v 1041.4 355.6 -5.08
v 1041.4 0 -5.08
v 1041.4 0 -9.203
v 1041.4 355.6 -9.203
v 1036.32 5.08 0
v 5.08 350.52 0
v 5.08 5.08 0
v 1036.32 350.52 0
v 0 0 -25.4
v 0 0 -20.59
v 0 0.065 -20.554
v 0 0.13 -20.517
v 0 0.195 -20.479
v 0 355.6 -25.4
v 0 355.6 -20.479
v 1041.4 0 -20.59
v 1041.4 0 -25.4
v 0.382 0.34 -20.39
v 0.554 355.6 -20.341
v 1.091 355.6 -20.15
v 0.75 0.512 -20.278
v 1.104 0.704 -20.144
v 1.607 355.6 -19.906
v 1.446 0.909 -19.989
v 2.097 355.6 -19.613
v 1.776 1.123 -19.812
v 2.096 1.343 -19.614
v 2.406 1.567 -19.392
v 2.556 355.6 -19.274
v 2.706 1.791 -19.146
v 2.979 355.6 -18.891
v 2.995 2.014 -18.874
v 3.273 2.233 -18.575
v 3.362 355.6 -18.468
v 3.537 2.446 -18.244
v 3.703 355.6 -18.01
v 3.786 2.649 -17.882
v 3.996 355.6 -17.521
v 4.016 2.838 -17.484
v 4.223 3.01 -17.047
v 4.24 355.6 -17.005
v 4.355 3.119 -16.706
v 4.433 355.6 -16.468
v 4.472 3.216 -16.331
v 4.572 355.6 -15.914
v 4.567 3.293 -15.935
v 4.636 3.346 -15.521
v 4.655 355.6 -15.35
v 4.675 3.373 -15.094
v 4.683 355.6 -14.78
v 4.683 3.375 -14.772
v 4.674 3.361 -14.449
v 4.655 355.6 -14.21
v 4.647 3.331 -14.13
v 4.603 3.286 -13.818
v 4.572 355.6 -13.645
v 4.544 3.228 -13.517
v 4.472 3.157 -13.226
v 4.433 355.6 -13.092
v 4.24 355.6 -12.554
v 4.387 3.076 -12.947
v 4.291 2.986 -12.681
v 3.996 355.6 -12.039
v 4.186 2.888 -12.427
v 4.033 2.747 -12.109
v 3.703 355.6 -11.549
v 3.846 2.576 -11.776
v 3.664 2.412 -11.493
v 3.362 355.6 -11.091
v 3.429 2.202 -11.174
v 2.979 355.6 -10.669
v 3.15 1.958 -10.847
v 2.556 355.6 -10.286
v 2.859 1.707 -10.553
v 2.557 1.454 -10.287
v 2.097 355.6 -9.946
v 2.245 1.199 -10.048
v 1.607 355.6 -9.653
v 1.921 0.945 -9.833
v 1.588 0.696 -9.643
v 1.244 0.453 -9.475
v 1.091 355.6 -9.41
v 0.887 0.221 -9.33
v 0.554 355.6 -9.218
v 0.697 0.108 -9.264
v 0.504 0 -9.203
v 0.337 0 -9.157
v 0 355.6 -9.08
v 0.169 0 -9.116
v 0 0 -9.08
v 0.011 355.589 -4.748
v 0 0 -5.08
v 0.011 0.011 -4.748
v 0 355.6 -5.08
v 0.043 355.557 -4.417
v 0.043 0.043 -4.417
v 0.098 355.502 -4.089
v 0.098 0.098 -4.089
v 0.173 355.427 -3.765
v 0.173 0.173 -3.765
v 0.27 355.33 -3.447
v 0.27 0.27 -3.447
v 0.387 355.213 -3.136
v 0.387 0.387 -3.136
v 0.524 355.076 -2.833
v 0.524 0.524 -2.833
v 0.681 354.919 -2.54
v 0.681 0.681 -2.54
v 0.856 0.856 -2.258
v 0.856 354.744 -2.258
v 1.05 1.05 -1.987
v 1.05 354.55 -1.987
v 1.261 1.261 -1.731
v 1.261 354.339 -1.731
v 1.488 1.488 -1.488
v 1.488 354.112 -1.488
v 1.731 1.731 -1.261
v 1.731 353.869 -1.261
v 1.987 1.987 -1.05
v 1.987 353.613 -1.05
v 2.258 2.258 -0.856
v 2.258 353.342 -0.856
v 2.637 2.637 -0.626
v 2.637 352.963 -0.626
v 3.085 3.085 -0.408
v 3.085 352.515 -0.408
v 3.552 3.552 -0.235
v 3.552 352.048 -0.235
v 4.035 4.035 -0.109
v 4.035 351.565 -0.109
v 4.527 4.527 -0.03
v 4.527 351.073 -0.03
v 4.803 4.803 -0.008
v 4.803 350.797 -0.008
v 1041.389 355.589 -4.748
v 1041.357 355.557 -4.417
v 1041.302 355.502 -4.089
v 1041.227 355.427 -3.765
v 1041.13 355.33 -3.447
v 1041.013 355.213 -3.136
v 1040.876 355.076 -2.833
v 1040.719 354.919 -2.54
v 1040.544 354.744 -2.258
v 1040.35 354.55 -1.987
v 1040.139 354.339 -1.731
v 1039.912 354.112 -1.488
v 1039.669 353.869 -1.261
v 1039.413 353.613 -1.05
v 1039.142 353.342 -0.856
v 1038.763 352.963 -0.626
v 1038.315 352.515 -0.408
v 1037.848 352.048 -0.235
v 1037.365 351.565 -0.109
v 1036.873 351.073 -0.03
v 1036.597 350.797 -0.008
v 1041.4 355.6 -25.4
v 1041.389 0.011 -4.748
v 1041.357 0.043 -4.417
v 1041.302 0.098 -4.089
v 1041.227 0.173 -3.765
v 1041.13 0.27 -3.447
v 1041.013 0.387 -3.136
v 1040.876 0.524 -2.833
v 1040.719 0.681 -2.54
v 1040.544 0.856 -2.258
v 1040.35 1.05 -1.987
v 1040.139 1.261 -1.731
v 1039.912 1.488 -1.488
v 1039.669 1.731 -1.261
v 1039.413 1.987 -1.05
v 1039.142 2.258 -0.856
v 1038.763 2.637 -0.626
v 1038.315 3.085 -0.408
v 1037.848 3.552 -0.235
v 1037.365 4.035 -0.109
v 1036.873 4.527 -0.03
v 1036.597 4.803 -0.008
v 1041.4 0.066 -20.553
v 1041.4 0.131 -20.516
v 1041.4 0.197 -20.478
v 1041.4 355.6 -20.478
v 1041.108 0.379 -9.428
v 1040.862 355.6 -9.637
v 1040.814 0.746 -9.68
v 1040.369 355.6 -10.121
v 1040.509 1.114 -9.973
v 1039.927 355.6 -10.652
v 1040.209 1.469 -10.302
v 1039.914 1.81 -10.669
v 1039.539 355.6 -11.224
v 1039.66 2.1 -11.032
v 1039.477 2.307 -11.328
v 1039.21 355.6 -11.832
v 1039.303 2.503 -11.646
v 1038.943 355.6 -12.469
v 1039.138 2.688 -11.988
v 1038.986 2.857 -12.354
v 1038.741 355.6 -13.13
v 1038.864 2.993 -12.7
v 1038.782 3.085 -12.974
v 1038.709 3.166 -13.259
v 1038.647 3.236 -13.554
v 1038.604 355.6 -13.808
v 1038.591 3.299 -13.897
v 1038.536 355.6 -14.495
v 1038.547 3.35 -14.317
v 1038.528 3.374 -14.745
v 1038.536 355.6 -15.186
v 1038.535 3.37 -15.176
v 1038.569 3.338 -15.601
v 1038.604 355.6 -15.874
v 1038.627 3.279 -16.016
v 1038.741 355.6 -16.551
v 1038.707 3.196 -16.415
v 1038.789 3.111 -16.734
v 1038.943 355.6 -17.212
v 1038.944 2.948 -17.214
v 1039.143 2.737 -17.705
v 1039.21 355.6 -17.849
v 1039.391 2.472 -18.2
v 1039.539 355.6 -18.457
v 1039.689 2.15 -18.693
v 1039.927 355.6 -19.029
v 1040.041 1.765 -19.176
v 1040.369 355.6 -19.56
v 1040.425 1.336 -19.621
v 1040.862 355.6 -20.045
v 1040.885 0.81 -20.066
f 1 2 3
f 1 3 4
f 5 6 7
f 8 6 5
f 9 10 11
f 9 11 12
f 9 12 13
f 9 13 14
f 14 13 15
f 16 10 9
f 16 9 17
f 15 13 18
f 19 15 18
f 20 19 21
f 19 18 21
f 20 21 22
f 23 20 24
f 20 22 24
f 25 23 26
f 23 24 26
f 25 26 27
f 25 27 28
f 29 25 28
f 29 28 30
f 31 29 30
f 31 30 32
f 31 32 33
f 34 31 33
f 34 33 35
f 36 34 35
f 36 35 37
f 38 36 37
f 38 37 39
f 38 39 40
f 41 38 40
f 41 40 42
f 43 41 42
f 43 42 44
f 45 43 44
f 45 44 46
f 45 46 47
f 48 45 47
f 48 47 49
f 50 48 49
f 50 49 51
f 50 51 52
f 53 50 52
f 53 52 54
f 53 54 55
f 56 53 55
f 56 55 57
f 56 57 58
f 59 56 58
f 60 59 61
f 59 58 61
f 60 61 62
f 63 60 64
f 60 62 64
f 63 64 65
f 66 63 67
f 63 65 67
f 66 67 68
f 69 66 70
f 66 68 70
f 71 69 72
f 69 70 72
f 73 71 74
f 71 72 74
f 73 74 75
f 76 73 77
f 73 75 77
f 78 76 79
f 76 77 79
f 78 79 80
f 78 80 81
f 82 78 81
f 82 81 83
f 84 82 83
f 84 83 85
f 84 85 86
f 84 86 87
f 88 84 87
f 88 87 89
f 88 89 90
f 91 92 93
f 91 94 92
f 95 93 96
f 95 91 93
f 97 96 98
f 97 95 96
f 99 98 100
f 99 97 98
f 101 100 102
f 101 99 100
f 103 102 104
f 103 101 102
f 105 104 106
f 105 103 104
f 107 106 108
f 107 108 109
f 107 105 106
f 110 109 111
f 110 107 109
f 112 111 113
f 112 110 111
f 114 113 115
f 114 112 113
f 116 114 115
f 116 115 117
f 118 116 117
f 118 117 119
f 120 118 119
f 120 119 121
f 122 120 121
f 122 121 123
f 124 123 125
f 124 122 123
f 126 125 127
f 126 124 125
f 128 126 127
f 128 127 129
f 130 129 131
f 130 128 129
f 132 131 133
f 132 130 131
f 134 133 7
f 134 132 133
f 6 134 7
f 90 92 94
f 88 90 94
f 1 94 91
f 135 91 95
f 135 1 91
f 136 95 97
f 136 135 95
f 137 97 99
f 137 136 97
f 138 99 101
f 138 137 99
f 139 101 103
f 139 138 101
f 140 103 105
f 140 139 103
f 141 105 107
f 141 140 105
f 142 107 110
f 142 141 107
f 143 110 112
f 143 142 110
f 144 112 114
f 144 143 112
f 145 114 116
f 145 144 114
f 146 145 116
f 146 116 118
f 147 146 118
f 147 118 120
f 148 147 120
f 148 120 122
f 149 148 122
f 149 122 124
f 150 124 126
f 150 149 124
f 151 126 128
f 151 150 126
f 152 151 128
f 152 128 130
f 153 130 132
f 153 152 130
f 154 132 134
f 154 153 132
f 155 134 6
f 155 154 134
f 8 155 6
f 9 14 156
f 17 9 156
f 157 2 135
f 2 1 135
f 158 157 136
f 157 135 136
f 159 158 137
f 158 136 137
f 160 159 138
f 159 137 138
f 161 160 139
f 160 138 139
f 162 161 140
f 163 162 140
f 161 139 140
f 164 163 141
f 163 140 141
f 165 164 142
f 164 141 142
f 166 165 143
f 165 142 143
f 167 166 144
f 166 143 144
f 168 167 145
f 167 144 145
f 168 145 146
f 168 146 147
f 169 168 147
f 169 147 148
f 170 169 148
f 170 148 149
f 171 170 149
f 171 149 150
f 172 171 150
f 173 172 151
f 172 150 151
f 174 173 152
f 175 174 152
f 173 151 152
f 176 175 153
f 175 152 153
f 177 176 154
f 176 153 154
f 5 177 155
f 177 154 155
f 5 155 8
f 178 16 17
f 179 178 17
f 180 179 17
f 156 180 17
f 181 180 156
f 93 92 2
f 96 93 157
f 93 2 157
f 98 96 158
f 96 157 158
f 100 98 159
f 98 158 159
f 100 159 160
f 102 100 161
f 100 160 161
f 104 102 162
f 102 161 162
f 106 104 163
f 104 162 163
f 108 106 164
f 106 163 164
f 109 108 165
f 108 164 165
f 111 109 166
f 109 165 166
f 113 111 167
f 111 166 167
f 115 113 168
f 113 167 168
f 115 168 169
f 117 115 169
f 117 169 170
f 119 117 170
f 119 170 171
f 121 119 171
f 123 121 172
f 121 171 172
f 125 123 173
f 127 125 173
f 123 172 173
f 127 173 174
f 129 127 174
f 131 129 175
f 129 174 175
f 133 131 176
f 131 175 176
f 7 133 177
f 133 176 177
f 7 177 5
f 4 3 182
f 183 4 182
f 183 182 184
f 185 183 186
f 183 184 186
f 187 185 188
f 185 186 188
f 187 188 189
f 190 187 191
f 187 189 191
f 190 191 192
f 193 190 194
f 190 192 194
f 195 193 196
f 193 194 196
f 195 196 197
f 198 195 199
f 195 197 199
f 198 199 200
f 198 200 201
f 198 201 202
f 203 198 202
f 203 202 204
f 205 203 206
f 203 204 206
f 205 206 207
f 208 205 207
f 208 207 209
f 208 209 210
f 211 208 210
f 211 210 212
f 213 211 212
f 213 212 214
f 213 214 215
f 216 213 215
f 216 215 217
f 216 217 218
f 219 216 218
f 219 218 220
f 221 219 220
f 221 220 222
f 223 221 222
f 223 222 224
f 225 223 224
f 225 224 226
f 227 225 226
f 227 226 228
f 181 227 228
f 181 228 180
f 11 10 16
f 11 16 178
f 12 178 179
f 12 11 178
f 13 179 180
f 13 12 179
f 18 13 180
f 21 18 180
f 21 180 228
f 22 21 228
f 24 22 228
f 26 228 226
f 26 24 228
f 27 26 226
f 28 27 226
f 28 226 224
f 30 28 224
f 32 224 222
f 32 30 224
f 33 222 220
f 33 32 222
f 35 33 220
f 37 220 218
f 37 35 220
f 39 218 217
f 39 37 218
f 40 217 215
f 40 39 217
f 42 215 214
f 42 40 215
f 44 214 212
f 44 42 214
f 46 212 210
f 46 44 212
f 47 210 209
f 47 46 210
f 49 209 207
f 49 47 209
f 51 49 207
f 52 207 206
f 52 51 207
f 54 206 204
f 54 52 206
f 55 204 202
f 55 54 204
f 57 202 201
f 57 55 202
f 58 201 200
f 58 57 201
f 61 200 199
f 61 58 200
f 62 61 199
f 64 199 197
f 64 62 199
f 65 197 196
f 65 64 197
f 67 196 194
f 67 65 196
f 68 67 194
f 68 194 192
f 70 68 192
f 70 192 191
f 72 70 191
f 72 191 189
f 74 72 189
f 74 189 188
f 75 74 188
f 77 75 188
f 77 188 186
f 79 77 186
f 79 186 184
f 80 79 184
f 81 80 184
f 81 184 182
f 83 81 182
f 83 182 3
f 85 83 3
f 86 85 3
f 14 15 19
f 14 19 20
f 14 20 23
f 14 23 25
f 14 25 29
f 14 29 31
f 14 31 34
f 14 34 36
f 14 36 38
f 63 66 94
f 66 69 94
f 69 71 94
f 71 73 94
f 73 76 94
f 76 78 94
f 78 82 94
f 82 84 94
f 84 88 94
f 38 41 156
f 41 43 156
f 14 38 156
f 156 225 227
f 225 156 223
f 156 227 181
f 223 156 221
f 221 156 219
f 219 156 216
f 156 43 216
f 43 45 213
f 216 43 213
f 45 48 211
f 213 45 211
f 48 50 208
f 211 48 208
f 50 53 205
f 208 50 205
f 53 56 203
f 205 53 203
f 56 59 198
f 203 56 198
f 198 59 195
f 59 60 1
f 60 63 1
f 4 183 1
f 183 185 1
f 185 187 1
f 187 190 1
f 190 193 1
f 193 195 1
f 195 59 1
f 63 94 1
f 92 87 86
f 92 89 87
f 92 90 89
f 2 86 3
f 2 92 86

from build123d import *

# Parameters (mm, degrees)
F0_W     = 1041.4
F0_H     = 355.6
F1_DEPTH = 25.4
F2_R     = 5.08
F4_DEPTH = 355.601
F6_DEPTH = 1041.401
F8_DEPTH = 355.601


with BuildPart() as f1:
    # F0 (on Top) → F1 (new body)
    with BuildSketch(Plane.XY):
        with Locations((520.7, 177.8)):
            Rectangle(F0_W, F0_H)
    extrude(amount=-F1_DEPTH)

    # F2
    f2_edges = [f1.edges().sort_by_distance(p)[0] for p in [
        (520.7, 0, 0),
        (1041.4, 177.8, 0),
        (520.7, 355.6, 0),
        (0, 177.8, 0),
    ]]
    fillet(f2_edges, radius=F2_R)

    # F3 (on face) → F4 (cut, through all)
    with BuildSketch(Plane.XZ):
        with BuildLine():
            Line((0, -9.080117), (0, -20.479154))
            ThreePointArc((0, -20.479154), (4.683372, -14.779635), (0, -9.080117))
        make_face()
    extrude(amount=-F4_DEPTH, mode=Mode.SUBTRACT)

    # F5 (on Right) → F6 (cut, through all)
    with BuildSketch(Plane.YZ):
        with BuildLine():
            Line((0, -9.203359), (0, -20.589933))
            ThreePointArc((0, -20.589933), (3.376242, -14.896646), (0, -9.203359))
        make_face()
    extrude(amount=F6_DEPTH, mode=Mode.SUBTRACT)

    # F7 (on face) → F8 (cut, through all)
    with BuildSketch(Plane.XZ):
        with BuildLine():
            Line((1041.4, -20.478019), (1041.4, -9.203359))
            ThreePointArc((1041.4, -9.203359), (1038.527252, -14.840689), (1041.4, -20.478019))
        make_face()
    extrude(amount=-F8_DEPTH, mode=Mode.SUBTRACT)


solid = f1.part
